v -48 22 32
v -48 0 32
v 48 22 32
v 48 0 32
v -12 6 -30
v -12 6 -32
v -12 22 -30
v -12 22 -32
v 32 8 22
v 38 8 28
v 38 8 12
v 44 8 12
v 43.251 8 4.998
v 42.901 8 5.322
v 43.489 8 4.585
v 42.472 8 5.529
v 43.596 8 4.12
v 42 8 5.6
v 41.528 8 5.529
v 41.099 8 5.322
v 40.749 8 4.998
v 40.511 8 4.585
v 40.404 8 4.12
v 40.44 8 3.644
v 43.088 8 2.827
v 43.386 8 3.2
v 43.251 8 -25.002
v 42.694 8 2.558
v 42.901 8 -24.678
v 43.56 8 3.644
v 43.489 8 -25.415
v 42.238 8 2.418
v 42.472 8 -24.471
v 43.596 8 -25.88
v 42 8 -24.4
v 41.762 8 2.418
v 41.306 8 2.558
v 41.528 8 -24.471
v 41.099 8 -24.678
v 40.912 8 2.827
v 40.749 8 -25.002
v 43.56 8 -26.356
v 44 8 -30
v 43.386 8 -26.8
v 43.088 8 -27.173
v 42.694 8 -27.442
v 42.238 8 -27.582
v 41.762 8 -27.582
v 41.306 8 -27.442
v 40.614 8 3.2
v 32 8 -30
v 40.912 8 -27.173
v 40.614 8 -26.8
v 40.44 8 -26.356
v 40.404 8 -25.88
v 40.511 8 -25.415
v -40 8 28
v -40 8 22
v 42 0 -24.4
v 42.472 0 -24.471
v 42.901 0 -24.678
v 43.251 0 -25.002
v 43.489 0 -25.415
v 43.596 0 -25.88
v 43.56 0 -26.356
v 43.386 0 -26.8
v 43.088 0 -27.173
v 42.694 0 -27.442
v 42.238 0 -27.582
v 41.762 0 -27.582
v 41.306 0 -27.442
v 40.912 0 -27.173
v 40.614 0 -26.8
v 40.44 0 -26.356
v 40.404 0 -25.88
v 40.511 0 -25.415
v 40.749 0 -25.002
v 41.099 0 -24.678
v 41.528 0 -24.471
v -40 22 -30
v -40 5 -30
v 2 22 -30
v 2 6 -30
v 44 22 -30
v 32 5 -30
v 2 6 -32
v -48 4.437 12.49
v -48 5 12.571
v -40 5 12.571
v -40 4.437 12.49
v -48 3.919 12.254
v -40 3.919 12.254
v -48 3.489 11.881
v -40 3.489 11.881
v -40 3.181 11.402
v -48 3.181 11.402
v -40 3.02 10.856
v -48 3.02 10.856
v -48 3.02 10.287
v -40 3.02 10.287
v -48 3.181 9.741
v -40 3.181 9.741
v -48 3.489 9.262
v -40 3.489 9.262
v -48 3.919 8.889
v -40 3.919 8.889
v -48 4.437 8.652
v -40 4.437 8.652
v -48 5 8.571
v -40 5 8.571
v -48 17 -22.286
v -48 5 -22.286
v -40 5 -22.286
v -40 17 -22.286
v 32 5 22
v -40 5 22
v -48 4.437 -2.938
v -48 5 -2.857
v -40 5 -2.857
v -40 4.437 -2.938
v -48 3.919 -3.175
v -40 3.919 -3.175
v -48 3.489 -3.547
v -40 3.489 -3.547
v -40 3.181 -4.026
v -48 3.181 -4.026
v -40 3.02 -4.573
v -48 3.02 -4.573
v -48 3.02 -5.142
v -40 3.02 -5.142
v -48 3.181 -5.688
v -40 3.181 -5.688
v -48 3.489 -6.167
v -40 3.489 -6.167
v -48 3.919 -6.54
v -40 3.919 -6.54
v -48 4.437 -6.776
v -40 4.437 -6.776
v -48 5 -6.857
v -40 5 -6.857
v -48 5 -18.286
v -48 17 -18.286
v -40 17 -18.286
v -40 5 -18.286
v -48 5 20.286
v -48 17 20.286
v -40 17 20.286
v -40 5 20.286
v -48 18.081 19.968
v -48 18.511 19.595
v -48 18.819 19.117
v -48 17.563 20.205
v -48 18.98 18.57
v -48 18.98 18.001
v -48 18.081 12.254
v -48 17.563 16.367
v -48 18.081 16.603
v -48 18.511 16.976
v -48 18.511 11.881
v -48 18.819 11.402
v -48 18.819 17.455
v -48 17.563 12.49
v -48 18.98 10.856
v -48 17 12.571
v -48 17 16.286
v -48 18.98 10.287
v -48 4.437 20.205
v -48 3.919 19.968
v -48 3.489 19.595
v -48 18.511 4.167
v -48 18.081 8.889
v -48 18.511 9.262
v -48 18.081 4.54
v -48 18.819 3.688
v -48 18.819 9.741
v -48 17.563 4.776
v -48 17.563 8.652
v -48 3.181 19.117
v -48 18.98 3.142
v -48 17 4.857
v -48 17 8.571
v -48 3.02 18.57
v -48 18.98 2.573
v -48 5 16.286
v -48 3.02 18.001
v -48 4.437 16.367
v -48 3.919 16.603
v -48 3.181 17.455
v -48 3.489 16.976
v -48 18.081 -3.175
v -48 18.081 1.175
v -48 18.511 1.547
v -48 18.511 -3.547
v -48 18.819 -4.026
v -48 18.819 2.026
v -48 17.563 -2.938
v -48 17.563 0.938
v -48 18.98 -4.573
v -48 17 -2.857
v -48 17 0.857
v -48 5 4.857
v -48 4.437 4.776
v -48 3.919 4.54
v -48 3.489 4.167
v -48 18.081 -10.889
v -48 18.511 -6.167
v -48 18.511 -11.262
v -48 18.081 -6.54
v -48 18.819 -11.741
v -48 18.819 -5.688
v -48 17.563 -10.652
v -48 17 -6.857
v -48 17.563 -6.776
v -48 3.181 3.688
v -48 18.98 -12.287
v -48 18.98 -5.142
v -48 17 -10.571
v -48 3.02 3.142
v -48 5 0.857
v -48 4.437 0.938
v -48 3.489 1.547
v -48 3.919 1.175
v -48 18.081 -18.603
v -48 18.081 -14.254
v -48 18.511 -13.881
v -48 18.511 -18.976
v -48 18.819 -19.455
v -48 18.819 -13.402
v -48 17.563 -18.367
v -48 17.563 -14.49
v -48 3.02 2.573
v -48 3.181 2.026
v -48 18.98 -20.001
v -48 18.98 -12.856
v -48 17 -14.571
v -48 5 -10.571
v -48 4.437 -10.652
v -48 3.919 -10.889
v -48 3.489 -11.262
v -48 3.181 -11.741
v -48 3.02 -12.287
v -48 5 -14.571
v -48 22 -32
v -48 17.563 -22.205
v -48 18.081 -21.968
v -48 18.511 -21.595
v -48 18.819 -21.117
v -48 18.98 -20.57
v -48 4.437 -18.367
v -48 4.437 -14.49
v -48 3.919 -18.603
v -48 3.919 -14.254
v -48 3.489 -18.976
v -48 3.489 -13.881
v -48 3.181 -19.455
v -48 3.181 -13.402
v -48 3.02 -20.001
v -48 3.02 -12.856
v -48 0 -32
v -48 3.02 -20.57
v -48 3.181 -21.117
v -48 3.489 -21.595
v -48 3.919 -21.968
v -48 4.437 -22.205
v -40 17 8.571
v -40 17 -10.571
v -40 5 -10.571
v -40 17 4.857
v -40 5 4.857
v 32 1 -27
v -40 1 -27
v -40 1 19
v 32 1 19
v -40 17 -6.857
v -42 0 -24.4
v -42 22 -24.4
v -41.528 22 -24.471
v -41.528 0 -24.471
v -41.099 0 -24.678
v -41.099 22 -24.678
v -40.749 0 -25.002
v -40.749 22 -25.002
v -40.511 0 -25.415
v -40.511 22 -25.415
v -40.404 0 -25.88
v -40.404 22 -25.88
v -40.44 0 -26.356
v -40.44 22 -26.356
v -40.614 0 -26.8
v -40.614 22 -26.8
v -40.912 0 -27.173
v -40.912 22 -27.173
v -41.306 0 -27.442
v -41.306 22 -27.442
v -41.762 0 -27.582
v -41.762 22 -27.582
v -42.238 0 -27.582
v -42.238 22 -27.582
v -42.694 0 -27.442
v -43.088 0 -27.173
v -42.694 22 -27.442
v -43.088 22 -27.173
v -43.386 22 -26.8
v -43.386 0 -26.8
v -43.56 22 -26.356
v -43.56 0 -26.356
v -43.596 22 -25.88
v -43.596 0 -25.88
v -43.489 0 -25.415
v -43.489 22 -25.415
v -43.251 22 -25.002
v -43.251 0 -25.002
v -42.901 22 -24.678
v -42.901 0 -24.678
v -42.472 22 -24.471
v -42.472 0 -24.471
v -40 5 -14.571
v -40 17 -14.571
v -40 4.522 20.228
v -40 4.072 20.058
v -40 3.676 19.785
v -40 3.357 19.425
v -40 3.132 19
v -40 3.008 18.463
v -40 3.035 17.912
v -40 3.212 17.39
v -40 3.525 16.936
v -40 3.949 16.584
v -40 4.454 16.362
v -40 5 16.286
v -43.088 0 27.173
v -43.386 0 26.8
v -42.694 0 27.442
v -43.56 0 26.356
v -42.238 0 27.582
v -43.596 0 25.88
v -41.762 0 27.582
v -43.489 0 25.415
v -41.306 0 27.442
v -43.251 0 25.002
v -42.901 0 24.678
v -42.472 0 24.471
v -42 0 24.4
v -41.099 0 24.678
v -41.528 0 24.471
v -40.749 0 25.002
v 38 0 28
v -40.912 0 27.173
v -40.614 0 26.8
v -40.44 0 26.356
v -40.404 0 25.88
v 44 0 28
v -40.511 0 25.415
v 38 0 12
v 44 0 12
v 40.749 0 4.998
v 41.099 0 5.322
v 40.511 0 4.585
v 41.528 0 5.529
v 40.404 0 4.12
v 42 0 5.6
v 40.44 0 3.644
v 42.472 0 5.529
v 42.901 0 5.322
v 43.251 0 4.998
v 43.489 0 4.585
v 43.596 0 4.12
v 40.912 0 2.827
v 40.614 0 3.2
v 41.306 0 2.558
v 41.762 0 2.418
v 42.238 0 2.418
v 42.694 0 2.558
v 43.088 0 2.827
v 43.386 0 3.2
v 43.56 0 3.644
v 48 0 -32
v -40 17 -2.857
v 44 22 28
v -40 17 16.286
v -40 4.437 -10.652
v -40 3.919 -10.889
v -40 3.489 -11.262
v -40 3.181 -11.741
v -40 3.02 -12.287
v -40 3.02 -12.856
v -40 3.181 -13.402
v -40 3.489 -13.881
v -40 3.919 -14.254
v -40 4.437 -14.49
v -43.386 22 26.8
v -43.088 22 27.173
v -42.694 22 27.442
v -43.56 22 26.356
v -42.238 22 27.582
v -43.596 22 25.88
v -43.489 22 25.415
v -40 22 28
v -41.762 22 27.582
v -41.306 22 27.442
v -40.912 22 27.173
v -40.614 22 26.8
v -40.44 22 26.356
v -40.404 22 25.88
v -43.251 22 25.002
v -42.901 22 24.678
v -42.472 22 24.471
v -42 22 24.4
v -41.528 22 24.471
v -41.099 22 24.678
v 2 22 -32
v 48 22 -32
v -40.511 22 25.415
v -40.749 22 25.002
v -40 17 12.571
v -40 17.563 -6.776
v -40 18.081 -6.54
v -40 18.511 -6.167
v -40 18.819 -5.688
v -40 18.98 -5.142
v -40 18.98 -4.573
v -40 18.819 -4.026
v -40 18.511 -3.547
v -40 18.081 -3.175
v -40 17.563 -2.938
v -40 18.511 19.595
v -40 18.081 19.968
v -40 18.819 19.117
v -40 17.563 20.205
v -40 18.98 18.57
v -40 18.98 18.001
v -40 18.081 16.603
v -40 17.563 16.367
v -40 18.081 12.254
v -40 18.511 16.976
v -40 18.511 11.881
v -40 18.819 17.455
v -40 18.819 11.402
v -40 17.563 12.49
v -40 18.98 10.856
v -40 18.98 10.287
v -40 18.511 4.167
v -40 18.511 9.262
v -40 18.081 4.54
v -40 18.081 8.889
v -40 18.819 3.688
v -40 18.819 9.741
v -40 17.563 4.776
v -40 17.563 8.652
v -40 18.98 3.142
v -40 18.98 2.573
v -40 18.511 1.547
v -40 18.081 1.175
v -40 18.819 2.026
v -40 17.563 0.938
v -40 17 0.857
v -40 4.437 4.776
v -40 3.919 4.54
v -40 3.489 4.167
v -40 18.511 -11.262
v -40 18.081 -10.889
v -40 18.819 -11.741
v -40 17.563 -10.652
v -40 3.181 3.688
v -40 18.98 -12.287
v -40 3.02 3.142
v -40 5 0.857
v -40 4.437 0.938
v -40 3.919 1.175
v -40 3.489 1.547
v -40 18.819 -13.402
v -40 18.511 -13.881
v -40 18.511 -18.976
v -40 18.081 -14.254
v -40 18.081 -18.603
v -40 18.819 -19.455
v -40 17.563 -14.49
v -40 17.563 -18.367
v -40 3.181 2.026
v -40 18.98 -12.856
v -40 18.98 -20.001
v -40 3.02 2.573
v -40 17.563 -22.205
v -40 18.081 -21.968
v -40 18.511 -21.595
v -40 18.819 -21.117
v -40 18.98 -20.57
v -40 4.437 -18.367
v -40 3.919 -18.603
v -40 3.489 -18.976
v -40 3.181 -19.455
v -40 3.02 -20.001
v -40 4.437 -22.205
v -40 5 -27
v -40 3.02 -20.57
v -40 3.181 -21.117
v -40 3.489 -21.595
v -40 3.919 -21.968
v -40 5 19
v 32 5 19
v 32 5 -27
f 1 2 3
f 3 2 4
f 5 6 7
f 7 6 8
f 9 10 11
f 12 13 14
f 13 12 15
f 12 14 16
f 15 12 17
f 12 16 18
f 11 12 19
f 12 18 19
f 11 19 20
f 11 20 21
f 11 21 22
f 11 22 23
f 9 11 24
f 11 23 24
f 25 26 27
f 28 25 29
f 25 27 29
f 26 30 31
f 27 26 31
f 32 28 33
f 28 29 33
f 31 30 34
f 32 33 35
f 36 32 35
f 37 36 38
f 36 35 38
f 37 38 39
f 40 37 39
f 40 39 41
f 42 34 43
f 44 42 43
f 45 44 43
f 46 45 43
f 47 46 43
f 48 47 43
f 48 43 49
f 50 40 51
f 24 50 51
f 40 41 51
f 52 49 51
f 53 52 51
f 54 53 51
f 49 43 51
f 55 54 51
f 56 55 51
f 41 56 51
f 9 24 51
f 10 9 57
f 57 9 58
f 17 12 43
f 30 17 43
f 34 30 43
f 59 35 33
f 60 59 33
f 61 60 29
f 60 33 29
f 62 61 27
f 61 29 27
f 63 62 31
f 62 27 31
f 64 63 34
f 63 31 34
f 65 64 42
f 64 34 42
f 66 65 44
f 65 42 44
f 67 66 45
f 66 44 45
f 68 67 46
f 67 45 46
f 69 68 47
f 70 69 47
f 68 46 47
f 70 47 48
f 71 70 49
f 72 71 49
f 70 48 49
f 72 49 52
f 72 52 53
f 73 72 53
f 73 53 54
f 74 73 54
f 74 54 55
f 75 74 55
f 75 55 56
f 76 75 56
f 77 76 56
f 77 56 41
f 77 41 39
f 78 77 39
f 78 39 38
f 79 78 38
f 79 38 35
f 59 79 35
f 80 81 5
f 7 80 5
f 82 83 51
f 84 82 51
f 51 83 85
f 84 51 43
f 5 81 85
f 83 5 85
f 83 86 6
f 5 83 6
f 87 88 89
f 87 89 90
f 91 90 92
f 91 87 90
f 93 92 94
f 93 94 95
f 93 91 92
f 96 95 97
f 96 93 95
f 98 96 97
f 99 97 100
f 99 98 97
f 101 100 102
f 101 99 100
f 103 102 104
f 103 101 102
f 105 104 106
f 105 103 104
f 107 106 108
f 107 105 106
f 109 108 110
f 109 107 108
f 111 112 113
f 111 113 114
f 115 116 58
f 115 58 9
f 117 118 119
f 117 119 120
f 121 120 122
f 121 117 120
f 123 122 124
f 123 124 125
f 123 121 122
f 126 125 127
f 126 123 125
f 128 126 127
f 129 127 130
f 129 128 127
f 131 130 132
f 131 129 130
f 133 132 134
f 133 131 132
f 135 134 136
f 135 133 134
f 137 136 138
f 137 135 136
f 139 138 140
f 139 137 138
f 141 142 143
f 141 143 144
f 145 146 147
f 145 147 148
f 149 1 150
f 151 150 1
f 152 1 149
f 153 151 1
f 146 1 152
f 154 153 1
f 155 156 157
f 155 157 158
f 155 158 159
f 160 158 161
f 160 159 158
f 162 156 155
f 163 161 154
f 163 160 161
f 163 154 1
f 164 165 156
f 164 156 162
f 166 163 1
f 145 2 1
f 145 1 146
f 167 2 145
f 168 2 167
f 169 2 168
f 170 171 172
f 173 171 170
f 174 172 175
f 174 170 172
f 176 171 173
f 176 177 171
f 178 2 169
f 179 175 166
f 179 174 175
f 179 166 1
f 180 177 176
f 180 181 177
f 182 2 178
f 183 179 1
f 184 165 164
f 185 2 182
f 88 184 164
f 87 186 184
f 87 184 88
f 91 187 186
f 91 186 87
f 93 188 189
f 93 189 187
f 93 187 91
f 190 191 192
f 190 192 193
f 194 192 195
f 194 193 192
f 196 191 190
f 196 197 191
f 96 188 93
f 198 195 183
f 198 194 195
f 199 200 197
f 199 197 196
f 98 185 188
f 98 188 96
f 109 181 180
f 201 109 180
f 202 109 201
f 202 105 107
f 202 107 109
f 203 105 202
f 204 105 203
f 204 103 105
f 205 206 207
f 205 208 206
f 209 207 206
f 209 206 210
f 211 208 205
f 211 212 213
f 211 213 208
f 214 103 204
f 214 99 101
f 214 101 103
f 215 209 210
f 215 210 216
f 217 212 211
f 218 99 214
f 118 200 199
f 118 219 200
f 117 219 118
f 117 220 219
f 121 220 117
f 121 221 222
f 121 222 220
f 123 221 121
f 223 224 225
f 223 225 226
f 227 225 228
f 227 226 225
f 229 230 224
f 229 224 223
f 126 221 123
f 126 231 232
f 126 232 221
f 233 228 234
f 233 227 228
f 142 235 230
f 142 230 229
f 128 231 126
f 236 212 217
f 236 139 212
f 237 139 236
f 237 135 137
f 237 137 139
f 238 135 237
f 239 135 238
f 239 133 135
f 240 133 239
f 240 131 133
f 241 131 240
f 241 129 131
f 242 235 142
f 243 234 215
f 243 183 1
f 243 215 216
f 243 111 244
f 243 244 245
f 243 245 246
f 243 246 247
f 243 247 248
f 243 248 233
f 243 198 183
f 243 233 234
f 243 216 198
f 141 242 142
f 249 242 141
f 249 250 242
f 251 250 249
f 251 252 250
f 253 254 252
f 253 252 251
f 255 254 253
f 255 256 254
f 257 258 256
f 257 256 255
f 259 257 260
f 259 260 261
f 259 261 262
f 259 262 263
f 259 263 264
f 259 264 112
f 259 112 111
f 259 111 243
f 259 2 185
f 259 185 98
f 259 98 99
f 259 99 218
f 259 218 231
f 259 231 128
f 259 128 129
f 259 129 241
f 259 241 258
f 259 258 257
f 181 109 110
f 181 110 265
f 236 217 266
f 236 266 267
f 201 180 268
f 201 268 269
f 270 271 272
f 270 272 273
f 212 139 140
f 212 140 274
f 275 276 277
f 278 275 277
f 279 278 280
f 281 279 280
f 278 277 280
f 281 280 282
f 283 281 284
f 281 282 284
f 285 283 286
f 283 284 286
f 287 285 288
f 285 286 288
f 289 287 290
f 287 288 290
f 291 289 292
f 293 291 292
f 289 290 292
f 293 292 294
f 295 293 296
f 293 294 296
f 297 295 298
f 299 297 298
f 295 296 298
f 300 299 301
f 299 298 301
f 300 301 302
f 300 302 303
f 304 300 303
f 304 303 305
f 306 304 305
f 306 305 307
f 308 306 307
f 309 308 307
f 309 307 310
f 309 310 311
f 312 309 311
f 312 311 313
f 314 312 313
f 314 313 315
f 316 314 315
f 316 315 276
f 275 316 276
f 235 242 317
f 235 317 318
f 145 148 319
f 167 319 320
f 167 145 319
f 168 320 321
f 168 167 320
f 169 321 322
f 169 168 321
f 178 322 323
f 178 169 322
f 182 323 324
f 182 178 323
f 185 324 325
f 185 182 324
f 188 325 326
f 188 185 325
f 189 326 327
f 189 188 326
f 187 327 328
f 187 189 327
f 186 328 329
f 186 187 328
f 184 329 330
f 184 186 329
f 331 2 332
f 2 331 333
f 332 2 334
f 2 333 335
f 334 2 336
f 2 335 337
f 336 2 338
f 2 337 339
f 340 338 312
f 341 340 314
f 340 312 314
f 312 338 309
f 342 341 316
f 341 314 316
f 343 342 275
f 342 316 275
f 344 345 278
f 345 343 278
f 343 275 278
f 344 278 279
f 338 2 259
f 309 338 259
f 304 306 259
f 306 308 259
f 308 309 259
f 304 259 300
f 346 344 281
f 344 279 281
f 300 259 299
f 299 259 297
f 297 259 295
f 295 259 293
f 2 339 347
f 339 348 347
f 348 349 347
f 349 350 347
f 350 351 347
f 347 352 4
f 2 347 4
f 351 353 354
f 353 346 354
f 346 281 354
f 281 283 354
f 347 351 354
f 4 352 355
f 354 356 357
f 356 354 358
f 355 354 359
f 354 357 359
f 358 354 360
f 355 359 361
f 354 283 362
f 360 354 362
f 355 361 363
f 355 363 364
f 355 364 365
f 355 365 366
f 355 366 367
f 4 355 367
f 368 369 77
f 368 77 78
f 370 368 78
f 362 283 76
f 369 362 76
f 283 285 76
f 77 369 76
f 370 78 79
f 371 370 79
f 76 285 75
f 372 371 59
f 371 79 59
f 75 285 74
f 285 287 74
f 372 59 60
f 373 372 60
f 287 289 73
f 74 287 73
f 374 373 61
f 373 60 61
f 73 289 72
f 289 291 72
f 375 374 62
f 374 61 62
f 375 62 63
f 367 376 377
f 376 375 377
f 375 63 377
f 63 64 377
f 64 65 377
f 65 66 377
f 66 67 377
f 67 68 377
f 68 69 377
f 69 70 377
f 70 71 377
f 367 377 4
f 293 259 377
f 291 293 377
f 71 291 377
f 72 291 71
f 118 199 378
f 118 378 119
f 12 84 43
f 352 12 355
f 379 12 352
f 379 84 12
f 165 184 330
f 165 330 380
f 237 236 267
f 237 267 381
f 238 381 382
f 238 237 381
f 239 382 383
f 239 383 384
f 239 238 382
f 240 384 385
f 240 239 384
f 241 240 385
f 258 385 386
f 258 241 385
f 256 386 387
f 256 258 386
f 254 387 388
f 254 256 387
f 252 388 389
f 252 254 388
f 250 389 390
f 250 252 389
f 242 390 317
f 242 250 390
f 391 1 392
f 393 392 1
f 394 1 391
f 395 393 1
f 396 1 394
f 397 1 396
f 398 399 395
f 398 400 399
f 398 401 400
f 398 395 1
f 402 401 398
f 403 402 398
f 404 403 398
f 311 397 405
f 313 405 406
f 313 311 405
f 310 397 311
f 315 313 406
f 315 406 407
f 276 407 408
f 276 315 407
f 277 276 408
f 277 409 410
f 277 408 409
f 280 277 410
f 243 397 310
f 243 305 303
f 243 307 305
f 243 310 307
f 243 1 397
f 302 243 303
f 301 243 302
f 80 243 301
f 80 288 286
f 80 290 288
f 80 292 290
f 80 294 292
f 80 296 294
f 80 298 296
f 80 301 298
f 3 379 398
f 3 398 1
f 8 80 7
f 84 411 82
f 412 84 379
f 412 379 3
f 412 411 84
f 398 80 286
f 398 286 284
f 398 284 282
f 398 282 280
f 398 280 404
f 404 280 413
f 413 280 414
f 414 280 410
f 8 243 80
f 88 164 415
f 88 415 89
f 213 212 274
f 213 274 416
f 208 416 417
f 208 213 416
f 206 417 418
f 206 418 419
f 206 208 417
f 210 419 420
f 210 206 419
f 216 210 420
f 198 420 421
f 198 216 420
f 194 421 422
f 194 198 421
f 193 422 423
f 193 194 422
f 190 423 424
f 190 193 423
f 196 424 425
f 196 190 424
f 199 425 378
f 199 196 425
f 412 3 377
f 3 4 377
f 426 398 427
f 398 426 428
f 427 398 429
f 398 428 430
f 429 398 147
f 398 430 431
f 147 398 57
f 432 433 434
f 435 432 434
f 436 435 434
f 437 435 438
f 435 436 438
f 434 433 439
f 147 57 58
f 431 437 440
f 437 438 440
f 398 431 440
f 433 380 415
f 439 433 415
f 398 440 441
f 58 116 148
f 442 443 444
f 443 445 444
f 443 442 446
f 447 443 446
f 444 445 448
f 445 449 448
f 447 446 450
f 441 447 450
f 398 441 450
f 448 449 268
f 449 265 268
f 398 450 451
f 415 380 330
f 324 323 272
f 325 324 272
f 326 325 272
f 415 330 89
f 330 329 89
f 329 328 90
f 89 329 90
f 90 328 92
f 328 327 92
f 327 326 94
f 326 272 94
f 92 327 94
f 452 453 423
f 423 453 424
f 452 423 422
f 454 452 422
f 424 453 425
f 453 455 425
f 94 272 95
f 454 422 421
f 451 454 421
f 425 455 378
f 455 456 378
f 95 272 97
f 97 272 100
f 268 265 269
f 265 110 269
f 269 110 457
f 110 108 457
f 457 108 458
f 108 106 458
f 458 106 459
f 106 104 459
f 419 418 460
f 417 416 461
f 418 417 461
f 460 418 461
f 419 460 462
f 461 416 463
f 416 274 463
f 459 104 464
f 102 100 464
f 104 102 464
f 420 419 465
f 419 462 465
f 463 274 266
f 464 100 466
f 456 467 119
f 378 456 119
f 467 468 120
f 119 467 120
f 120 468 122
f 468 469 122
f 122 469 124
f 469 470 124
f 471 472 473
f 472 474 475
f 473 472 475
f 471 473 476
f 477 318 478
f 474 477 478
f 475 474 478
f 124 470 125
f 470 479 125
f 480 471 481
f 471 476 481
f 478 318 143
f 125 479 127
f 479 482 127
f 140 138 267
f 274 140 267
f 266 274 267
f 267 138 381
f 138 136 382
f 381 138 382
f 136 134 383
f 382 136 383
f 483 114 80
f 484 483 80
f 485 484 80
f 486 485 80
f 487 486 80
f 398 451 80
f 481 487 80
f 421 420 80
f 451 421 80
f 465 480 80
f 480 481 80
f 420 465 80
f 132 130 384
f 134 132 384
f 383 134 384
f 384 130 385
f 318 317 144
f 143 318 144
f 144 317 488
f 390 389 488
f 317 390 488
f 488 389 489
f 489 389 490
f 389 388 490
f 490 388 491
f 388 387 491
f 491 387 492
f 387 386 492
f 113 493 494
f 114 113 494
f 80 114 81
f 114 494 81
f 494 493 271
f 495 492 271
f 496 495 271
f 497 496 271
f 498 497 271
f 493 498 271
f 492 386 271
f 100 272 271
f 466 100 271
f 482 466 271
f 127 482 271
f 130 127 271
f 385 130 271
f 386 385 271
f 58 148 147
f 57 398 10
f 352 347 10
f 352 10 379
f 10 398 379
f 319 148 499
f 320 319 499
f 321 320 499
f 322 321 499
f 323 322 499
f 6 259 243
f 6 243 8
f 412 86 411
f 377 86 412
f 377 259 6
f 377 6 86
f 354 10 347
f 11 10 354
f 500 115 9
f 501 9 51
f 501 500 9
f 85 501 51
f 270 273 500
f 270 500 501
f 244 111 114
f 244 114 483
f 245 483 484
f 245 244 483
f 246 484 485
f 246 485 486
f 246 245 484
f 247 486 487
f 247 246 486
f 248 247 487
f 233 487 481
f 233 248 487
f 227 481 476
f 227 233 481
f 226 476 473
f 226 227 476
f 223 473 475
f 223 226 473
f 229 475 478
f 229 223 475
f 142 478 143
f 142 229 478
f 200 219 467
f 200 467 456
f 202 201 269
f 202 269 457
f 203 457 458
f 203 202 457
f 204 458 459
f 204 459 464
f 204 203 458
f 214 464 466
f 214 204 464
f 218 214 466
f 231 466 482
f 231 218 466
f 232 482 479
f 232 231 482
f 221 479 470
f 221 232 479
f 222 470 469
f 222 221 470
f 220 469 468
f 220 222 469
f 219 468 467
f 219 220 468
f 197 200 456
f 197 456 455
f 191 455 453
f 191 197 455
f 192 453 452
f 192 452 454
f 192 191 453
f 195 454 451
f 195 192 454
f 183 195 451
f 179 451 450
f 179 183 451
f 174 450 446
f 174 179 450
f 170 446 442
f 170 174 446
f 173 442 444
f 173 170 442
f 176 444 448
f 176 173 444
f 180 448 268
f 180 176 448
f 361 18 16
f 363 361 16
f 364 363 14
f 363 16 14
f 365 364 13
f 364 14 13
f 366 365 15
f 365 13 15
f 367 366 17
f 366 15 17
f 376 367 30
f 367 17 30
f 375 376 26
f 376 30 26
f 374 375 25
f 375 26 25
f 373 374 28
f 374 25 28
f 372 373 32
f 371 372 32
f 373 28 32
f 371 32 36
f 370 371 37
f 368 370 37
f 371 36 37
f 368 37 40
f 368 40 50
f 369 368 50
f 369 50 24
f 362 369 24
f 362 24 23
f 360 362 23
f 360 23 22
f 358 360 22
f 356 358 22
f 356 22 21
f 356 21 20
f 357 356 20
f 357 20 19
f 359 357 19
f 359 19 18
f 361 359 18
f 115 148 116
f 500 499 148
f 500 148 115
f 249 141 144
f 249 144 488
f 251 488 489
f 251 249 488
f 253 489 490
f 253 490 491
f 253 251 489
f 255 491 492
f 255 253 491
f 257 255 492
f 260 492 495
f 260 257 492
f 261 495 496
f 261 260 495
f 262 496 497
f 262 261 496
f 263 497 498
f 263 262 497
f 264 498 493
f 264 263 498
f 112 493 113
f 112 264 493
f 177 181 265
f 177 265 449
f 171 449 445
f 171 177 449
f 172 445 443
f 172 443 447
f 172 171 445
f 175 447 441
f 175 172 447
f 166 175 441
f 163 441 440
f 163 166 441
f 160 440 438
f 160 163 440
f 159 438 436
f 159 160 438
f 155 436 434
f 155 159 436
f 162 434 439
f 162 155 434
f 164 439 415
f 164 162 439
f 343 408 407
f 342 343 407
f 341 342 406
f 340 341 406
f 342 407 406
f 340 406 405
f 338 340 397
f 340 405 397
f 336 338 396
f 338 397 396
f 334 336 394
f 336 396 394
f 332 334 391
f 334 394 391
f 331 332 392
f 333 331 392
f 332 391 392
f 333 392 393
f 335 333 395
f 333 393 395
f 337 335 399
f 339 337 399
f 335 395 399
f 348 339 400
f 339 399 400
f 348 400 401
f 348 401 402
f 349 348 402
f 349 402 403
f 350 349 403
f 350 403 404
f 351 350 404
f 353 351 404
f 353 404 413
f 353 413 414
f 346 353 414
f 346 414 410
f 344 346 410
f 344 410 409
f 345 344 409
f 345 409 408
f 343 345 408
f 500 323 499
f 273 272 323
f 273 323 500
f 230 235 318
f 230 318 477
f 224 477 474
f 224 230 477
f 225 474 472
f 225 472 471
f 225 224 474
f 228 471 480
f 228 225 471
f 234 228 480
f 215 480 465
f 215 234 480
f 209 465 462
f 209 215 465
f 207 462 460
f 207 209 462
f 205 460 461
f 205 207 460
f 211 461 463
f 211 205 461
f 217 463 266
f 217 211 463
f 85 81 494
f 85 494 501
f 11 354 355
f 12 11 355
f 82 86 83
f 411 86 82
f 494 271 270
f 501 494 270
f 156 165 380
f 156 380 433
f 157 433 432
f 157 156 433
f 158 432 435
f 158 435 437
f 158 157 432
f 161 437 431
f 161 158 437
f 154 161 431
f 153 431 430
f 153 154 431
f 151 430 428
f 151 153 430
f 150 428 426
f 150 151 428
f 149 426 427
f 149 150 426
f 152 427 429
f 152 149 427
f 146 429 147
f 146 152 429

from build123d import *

# Parameters (mm, degrees)
SKETCH1_W                      = 96
SKETCH1_H                      = 64
BOSS_EXTRUDE1_DEPTH            = 1
SKETCH2_W                      = 96
SKETCH2_H                      = 64
SKETCH2_W_2                    = 72
SKETCH2_H_2                    = 52
BOSS_EXTRUDE2_DEPTH            = 21
SKETCH3_W                      = 72
SKETCH3_H                      = 3
BOSS_EXTRUDE3_DEPTH            = 4
SKETCH4_W                      = 72
SKETCH4_H                      = 6
CUT_EXTRUDE1_DEPTH             = 14
SKETCH5_W                      = 6
SKETCH5_H                      = 16
CUT_EXTRUDE2_DEPTH             = 60.363288319
CUT_EXTRUDE3_REACH             = 84.97
SKETCH6_W                      = 14
SKETCH6_H                      = 16
CUT_EXTRUDE3_DIRECTION_2_DEPTH = 83.969874051
SKETCH7_R                      = 1.6
CUT_EXTRUDE4_DEPTH             = 62.741396162
CUT_EXTRUDE5_DEPTH             = 8


with BuildPart() as part:
    # Sketch1 → Boss-Extrude1 (new body)
    with BuildSketch(Plane(origin=(0, 0, 0), x_dir=(1, 0, 0), z_dir=(0, 1, 0))):
        Rectangle(SKETCH1_W, SKETCH1_H)
    extrude(amount=BOSS_EXTRUDE1_DEPTH)

    # Sketch2 → Boss-Extrude2 (add)
    with BuildSketch(Plane(origin=(0, 1, 0), x_dir=(1, 0, 0), z_dir=(0, 1, 0))):
        Rectangle(SKETCH2_W, SKETCH2_H)
        with Locations((-4, 4)):
            Rectangle(SKETCH2_W_2, SKETCH2_H_2, mode=Mode.SUBTRACT)
    extrude(amount=BOSS_EXTRUDE2_DEPTH)

    # Sketch3 → Boss-Extrude3 (add)
    with BuildSketch(Plane(origin=(0, 1, 0), x_dir=(1, 0, 0), z_dir=(0, 1, 0))):
        with Locations((-4, -20.5)):
            Rectangle(SKETCH3_W, SKETCH3_H)
        with Locations((-4, 28.5)):
            Rectangle(SKETCH3_W, SKETCH3_H)
    extrude(amount=BOSS_EXTRUDE3_DEPTH)

    # Sketch4 → Cut-Extrude1 (cut)
    with BuildSketch(Plane(origin=(0, 22, 0), x_dir=(1, 0, 0), z_dir=(0, 1, 0))):
        Polygon((44, 30), (44, -28), (32, -28), (32, -22), (32, 30), align=None)
        with Locations((-4, -25)):
            Rectangle(SKETCH4_W, SKETCH4_H)
    extrude(amount=-CUT_EXTRUDE1_DEPTH, mode=Mode.SUBTRACT)

    # Sketch5 → Cut-Extrude2 (cut, through all)
    with BuildSketch(Plane(origin=(0, 8, 0), x_dir=(1, 0, 0), z_dir=(0, 1, 0))):
        with Locations((41, -20)):
            Rectangle(SKETCH5_W, SKETCH5_H)
    extrude(amount=-CUT_EXTRUDE2_DEPTH, mode=Mode.SUBTRACT)

    # Sketch6 → Cut-Extrude3 (cut, up to next)
    with BuildSketch(Plane(origin=(0, 0, -32), x_dir=(-1, 0, 0), z_dir=(0, 0, -1)), mode=Mode.PRIVATE) as cut_extrude3_sk1:
        with Locations((5, 14)):
            Rectangle(SKETCH6_W, SKETCH6_H)
    cut_extrude3_tool1 = extrude(cut_extrude3_sk1.sketch, amount=-CUT_EXTRUDE3_REACH, mode=Mode.PRIVATE) & part.part
    add(cut_extrude3_tool1.solids().sort_by_distance((-5, 14, -32))[0], mode=Mode.SUBTRACT)

    # Sketch6 → Cut-Extrude3 direction 2 (cut)
    with BuildSketch(Plane(origin=(0, 0, -32), x_dir=(-1, 0, 0), z_dir=(0, 0, -1))):
        with Locations((5, 14)):
            Rectangle(SKETCH6_W, SKETCH6_H)
    extrude(amount=CUT_EXTRUDE3_DIRECTION_2_DEPTH, mode=Mode.SUBTRACT)

    # Sketch7 → Cut-Extrude4 (cut, through all)
    with BuildSketch(Plane(origin=(0, 22, 0), x_dir=(1, 0, 0), z_dir=(0, 1, 0))):
        with Locations(Location((-42, 26, 0), (0, 0, 270))):
            Circle(SKETCH7_R)
        with Locations(Location((-42, -26, 0), (0, 0, 90))):
            Circle(SKETCH7_R)
        with Locations(Location((42, 26, 0), (0, 0, 270))):
            Circle(SKETCH7_R)
        with Locations(Location((42, -4, 0), (0, 0, 270))):
            Circle(SKETCH7_R)
    extrude(amount=-CUT_EXTRUDE4_DEPTH, mode=Mode.SUBTRACT)

    # Sketch9 → Cut-Extrude5 (cut)
    with BuildSketch(Plane.ZY.offset(48)):
        with BuildLine():
            Line((-18.285714286, 17), (-18.285714286, 5))
            ThreePointArc((-18.285714286, 5), (-20.285714286, 3), (-22.285714286, 5))
            Line((-22.285714286, 5), (-22.285714286, 17))
            ThreePointArc((-22.285714286, 17), (-20.285714286, 19), (-18.285714286, 17))
        make_face()
        with BuildLine():
            Line((-10.571428571, 17), (-10.571428571, 5))
            ThreePointArc((-10.571428571, 5), (-12.571428571, 3), (-14.571428571, 5))
            Line((-14.571428571, 5), (-14.571428571, 17))
            ThreePointArc((-14.571428571, 17), (-12.571428571, 19), (-10.571428571, 17))
        make_face()
        with BuildLine():
            Line((-2.857142857, 17), (-2.857142857, 5))
            ThreePointArc((-2.857142857, 5), (-4.857142857, 3), (-6.857142857, 5))
            Line((-6.857142857, 5), (-6.857142857, 17))
            ThreePointArc((-6.857142857, 17), (-4.857142857, 19), (-2.857142857, 17))
        make_face()
        with BuildLine():
            Line((4.857142857, 17), (4.857142857, 5))
            ThreePointArc((4.857142857, 5), (2.857142857, 3), (0.857142857, 5))
            Line((0.857142857, 5), (0.857142857, 17))
            ThreePointArc((0.857142857, 17), (2.857142857, 19), (4.857142857, 17))
        make_face()
        with BuildLine():
            Line((12.571428571, 17), (12.571428571, 5))
            ThreePointArc((12.571428571, 5), (10.571428571, 3), (8.571428571, 5))
            Line((8.571428571, 5), (8.571428571, 17))
            ThreePointArc((8.571428571, 17), (10.571428571, 19), (12.571428571, 17))
        make_face()
        with BuildLine():
            Line((20.285714286, 17), (20.285714286, 5))
            ThreePointArc((20.285714286, 5), (18.285714286, 3), (16.285714286, 5))
            Line((16.285714286, 5), (16.285714286, 17))
            ThreePointArc((16.285714286, 17), (18.285714286, 19), (20.285714286, 17))
        make_face()
    extrude(amount=-CUT_EXTRUDE5_DEPTH, mode=Mode.SUBTRACT)


solid = part.part
